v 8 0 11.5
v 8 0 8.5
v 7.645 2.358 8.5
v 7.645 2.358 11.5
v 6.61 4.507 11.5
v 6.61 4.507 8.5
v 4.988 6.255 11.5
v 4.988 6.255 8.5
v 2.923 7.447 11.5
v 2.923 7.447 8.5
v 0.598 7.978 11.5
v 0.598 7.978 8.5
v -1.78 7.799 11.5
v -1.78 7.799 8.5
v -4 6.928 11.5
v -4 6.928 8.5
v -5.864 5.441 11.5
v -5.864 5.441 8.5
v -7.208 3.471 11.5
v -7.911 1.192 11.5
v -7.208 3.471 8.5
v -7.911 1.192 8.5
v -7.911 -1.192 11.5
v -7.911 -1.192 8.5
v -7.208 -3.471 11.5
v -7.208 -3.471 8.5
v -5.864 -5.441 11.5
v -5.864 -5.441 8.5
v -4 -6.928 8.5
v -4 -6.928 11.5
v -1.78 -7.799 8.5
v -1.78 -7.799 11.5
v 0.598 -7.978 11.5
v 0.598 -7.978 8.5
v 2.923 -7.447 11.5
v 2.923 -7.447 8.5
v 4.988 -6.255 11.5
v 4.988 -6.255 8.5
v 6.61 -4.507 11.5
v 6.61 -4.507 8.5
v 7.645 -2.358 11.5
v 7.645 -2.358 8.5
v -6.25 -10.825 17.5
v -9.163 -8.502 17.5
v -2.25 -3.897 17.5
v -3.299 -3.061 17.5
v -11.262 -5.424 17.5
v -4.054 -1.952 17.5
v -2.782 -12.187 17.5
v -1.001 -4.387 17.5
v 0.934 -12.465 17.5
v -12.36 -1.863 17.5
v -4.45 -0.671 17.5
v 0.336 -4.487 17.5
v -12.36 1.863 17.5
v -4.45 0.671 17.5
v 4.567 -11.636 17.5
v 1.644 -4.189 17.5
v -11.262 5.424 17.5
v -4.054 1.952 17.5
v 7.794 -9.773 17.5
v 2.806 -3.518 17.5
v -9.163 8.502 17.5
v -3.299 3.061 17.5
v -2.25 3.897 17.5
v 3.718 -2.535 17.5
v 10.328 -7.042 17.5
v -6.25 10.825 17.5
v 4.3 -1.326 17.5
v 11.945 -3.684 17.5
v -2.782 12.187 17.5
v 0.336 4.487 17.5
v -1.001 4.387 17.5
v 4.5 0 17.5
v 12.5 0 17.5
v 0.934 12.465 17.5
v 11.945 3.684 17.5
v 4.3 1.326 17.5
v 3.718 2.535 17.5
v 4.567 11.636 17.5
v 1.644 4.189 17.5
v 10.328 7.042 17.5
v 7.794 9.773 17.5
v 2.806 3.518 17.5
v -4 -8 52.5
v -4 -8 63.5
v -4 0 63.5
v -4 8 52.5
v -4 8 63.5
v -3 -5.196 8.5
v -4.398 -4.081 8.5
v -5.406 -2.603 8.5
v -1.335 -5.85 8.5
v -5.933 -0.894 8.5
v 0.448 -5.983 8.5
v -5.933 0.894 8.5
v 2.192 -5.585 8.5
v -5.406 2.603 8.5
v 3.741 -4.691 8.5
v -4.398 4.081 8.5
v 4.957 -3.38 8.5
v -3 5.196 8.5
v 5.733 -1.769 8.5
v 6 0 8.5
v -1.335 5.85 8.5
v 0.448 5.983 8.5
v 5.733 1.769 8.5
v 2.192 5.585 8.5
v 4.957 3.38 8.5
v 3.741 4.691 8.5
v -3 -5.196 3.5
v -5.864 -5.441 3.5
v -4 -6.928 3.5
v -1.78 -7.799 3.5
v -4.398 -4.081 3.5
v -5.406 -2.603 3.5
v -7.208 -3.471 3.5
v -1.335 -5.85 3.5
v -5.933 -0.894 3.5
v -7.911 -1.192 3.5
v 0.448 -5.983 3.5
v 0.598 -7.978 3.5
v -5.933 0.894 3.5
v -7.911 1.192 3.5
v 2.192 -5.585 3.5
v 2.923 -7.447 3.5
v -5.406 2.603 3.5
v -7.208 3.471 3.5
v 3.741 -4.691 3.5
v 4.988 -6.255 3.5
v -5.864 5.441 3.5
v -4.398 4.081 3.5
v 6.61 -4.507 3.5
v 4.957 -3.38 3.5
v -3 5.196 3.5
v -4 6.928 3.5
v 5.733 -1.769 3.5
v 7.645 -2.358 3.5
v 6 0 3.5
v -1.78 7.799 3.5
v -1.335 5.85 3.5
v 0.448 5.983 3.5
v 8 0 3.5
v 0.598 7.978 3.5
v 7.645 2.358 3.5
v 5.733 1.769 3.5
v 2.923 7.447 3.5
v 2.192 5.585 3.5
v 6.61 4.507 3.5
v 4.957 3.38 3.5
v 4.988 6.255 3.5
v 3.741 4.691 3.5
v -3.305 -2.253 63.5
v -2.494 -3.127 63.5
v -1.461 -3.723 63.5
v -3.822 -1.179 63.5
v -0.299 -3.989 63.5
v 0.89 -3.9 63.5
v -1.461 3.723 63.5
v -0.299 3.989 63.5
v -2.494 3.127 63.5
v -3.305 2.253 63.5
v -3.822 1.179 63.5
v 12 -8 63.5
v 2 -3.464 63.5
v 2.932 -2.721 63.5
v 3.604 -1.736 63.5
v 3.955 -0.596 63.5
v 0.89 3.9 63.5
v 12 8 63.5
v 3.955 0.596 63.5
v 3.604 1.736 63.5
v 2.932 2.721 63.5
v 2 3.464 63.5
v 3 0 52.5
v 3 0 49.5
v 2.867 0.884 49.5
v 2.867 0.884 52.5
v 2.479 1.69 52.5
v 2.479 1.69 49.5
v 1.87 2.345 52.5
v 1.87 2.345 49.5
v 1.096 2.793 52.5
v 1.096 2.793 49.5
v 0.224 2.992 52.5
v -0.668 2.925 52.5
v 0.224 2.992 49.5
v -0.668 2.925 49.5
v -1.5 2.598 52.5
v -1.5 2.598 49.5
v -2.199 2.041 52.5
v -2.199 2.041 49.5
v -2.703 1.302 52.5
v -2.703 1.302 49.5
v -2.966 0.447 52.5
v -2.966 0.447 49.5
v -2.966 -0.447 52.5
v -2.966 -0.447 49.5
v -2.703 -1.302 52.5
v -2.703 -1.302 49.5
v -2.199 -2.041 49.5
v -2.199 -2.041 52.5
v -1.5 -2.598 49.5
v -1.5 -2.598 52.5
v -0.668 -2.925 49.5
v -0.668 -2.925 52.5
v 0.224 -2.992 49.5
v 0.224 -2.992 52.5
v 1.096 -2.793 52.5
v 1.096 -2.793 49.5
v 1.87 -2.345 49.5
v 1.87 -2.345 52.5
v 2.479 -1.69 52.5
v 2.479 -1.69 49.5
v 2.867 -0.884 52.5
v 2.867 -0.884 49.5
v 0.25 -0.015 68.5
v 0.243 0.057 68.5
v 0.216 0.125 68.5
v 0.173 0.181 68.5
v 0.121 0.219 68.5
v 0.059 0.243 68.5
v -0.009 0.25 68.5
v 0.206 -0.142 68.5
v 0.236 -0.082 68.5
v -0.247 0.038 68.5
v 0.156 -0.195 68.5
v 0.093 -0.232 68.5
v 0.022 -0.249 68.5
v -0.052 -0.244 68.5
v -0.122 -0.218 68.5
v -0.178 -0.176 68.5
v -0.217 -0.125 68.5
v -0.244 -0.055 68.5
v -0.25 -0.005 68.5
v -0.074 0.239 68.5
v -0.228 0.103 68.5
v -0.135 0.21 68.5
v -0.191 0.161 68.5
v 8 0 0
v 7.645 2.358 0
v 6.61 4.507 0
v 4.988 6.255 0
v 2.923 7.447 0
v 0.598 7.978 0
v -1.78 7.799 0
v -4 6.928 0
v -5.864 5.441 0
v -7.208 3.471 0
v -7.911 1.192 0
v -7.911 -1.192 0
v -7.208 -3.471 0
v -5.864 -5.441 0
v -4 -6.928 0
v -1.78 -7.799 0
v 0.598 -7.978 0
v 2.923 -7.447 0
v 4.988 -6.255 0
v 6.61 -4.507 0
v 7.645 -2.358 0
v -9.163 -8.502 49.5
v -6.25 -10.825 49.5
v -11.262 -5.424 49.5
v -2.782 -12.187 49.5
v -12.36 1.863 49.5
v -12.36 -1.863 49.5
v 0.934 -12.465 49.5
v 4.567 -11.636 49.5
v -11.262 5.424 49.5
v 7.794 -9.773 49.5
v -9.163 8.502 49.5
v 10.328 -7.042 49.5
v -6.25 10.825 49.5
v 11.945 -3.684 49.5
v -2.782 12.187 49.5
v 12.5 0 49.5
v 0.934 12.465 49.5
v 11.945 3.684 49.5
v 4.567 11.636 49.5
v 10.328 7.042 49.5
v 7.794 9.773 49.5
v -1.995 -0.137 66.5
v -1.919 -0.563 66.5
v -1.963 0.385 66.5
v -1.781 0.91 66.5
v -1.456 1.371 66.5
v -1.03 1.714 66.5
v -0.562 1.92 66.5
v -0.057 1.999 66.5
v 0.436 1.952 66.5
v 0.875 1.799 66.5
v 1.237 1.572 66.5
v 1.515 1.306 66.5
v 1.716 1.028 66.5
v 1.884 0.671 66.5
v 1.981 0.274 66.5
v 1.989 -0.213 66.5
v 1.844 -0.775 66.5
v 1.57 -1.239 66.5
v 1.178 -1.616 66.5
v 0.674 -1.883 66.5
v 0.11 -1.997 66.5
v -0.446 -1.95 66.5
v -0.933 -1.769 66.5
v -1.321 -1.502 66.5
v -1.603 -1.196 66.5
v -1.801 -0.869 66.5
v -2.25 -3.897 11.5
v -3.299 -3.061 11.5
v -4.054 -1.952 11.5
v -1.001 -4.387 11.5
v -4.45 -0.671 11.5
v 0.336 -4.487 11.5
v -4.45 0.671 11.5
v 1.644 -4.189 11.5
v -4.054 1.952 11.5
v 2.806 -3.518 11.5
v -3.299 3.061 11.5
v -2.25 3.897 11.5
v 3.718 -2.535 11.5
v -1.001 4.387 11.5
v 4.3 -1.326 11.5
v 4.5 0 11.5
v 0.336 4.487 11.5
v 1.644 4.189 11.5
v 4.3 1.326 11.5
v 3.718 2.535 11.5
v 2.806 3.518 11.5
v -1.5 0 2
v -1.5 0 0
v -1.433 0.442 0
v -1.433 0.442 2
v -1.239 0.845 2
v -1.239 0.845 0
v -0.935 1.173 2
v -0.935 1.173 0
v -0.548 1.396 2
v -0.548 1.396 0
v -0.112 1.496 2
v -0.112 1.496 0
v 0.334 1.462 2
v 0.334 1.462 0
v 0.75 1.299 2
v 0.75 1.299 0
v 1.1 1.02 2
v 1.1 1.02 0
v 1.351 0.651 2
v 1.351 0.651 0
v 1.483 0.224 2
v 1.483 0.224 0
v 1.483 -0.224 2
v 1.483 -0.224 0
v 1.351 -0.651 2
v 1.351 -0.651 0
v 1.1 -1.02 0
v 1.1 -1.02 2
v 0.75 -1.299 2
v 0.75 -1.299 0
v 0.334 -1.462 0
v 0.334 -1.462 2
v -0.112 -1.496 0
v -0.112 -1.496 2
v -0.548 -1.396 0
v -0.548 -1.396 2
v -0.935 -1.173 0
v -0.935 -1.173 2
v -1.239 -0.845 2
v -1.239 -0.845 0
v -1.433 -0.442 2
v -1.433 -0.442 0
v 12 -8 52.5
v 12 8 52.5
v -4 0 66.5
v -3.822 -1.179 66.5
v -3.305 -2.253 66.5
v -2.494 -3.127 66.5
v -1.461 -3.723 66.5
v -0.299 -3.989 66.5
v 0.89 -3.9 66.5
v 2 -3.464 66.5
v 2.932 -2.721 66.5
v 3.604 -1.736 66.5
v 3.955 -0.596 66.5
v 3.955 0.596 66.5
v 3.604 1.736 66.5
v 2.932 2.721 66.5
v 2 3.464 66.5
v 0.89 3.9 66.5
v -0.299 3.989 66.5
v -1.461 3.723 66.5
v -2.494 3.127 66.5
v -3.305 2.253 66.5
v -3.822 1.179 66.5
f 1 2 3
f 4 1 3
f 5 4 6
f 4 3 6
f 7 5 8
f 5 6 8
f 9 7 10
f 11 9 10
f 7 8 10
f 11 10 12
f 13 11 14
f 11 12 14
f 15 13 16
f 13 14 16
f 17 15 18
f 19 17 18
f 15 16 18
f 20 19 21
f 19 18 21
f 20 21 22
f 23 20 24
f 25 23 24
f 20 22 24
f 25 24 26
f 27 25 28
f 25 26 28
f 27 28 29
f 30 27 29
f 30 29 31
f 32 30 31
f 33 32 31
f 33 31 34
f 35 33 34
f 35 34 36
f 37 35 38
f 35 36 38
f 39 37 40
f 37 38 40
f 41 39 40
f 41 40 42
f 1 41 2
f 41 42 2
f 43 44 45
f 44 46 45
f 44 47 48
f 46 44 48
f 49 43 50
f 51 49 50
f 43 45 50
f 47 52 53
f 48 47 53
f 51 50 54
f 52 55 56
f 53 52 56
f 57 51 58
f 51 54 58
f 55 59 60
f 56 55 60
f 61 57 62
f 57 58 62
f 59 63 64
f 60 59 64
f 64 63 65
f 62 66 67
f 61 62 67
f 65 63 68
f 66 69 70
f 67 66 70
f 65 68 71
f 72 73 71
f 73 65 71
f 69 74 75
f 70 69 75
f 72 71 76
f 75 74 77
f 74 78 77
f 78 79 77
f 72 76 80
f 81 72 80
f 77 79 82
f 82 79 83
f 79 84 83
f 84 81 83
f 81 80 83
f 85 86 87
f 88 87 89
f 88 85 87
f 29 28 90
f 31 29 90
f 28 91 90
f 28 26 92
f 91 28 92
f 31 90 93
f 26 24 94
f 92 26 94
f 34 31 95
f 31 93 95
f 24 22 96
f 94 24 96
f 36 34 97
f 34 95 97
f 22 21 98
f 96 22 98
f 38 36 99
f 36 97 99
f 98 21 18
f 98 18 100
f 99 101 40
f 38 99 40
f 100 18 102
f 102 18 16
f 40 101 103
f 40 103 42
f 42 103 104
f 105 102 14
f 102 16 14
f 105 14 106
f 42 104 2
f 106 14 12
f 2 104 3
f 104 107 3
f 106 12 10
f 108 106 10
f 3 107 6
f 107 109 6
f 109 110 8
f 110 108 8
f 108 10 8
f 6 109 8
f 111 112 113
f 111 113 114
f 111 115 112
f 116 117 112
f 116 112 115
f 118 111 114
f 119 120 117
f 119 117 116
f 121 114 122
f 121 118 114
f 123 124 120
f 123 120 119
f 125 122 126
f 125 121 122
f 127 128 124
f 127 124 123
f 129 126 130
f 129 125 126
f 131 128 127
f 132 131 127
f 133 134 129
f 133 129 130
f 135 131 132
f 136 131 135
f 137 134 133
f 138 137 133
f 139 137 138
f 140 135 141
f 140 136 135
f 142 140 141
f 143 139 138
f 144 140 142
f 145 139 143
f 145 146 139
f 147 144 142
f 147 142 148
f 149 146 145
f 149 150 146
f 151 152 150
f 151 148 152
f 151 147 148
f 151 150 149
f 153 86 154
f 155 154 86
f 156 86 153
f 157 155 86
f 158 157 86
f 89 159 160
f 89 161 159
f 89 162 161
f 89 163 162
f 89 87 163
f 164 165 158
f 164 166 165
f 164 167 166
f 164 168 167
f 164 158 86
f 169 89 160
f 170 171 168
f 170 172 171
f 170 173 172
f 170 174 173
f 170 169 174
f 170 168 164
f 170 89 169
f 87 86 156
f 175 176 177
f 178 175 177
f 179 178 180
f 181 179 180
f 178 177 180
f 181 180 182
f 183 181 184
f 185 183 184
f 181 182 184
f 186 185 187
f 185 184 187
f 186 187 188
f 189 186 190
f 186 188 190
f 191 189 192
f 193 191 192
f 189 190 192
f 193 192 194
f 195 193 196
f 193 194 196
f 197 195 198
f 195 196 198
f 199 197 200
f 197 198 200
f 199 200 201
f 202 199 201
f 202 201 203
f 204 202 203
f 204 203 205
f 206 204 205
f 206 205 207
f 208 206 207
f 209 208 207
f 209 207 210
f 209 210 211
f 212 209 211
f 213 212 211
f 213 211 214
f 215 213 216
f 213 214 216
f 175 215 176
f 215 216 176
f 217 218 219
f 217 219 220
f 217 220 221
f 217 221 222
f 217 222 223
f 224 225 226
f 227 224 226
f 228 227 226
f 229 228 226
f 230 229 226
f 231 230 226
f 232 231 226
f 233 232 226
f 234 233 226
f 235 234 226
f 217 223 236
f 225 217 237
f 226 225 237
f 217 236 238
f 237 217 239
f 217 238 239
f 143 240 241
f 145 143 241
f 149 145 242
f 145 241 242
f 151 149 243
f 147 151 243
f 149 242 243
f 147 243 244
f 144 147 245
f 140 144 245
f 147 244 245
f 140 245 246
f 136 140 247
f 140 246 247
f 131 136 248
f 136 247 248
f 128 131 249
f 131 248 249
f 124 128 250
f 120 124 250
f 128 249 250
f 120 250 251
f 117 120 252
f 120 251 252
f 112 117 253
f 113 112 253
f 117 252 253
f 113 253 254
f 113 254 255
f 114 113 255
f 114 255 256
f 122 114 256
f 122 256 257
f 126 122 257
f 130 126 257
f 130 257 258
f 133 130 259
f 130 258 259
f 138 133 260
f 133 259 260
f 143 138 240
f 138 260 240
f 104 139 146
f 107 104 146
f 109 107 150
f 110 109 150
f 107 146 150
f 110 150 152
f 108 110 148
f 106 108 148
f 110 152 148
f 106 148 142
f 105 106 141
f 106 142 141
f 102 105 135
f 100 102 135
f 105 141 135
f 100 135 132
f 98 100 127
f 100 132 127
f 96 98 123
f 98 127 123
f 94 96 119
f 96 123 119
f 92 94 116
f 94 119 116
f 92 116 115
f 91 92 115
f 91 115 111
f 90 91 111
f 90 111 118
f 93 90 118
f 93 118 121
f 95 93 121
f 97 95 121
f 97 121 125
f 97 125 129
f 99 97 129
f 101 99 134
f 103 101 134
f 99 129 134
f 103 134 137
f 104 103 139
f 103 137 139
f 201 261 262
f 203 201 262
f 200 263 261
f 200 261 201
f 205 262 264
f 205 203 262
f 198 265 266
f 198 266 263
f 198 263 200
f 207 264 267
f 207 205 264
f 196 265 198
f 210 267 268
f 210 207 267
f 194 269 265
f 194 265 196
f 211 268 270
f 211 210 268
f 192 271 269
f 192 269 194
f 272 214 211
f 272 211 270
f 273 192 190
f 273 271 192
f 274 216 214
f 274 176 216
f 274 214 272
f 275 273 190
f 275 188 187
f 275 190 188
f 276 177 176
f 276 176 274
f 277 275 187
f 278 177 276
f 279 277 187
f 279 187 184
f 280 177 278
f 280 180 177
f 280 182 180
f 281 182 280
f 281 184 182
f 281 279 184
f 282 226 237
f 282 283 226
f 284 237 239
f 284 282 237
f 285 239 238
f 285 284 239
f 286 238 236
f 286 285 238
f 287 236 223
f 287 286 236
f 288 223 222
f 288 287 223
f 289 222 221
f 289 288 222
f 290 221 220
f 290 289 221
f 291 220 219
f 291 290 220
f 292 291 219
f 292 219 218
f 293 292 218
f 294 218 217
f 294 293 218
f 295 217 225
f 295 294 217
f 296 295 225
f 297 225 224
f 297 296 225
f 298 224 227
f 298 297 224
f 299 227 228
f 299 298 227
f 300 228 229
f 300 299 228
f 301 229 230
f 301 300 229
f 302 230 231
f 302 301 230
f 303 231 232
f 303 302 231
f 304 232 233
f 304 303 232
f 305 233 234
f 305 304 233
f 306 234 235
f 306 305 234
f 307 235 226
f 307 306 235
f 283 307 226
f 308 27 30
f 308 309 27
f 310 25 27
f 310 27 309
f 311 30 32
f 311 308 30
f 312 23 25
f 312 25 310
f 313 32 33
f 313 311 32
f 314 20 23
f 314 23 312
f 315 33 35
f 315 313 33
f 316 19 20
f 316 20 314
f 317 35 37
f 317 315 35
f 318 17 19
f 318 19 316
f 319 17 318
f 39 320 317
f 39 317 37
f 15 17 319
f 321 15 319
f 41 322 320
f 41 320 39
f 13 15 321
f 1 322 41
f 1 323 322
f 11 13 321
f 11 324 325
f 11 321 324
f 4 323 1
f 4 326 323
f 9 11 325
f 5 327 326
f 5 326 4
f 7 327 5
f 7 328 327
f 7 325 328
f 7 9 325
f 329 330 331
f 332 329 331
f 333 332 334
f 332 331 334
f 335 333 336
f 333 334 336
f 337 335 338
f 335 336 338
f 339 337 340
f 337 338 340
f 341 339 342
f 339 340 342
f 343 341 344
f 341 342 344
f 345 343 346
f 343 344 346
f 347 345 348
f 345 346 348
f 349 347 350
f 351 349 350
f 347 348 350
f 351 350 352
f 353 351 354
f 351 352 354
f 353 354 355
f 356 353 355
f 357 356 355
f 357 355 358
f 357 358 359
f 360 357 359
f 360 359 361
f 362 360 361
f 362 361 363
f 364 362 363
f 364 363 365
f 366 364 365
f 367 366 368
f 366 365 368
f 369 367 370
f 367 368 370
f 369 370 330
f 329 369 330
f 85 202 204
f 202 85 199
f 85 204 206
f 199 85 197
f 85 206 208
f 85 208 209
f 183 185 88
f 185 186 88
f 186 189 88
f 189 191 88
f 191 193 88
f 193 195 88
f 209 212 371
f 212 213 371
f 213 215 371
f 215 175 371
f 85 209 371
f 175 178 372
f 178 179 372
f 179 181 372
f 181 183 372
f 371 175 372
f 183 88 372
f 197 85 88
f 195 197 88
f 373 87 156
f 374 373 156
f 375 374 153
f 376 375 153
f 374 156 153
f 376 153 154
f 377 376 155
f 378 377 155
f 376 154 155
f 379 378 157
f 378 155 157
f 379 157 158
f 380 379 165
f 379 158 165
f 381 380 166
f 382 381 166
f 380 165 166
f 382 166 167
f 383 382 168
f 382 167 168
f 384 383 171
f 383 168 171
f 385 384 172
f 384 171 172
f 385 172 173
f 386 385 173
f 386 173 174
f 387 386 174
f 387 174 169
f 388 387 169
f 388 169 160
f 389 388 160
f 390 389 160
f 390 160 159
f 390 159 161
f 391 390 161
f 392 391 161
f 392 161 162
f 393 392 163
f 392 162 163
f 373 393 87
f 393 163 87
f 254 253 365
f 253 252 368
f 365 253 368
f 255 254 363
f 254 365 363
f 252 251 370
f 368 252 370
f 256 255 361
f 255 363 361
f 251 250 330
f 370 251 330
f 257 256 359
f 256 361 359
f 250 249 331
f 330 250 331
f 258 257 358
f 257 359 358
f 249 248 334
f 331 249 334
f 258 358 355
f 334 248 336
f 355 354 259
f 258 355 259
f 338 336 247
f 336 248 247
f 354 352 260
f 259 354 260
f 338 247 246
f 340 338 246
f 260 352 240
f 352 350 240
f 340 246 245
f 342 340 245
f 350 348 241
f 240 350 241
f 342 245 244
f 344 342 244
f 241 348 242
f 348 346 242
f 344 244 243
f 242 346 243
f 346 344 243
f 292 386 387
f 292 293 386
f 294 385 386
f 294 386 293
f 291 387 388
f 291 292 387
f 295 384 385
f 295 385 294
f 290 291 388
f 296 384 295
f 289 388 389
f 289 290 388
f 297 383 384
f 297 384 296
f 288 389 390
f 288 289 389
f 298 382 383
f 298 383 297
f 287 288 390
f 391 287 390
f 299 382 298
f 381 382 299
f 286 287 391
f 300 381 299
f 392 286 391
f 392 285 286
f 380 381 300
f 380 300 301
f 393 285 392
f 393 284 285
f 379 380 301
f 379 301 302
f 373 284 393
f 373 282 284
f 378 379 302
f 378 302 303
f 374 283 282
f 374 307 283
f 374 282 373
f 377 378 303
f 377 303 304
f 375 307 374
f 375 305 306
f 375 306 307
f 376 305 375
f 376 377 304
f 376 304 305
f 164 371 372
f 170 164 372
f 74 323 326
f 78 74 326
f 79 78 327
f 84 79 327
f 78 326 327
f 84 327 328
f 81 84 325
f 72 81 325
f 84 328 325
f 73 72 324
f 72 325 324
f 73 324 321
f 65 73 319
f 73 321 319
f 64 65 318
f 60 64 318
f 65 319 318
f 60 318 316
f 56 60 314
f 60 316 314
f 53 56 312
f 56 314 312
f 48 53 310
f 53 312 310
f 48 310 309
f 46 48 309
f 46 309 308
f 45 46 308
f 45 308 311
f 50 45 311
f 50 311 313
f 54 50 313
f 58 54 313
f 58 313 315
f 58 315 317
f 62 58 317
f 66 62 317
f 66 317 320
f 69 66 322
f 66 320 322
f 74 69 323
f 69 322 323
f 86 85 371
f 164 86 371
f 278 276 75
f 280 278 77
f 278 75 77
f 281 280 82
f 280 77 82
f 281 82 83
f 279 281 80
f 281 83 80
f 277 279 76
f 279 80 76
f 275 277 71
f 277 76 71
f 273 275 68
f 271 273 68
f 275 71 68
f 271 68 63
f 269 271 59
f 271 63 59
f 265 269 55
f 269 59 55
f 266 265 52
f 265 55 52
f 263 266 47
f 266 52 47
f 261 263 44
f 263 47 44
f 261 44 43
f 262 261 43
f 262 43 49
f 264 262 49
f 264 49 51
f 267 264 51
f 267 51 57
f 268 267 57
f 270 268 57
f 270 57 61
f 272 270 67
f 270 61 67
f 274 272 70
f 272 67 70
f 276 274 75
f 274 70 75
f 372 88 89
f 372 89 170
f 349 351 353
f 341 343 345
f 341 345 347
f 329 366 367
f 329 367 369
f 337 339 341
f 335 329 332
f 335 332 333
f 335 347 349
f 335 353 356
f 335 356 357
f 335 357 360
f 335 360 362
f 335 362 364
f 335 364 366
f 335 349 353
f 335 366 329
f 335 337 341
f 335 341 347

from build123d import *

# Parameters (mm, degrees)
SKETCH1_R           = 8
BOSS_EXTRUDE1_DEPTH = 3.5
SKETCH2_R           = 6
BOSS_EXTRUDE2_DEPTH = 5
SKETCH3_R           = 8
BOSS_EXTRUDE3_DEPTH = 3
SKETCH4_R           = 4.5
BOSS_EXTRUDE4_DEPTH = 6
SKETCH5_R           = 12.5
BOSS_EXTRUDE5_DEPTH = 32
SKETCH6_R           = 3
BOSS_EXTRUDE6_DEPTH = 3
SKETCH7_W           = 16
SKETCH7_H           = 16
BOSS_EXTRUDE7_DEPTH = 11
SKETCH8_R           = 4
BOSS_EXTRUDE8_DEPTH = 3
SKETCH10_R          = 1.5
CUT_EXTRUDE1_DEPTH  = 2


with BuildPart() as part:
    # Sketch1 → Boss-Extrude1 (new body)
    with BuildSketch(Plane.XY):
        Circle(SKETCH1_R)
    extrude(amount=BOSS_EXTRUDE1_DEPTH)

    # Sketch2 → Boss-Extrude2 (add)
    with BuildSketch(Plane.XY.offset(3.5)):
        Circle(SKETCH2_R)
    extrude(amount=BOSS_EXTRUDE2_DEPTH)

    # Sketch3 → Boss-Extrude3 (add)
    with BuildSketch(Plane.XY.offset(8.5)):
        Circle(SKETCH3_R)
    extrude(amount=BOSS_EXTRUDE3_DEPTH)

    # Sketch4 → Boss-Extrude4 (add)
    with BuildSketch(Plane.XY.offset(11.5)):
        Circle(SKETCH4_R)
    extrude(amount=BOSS_EXTRUDE4_DEPTH)

    # Sketch5 → Boss-Extrude5 (add)
    with BuildSketch(Plane.XY.offset(17.5)):
        Circle(SKETCH5_R)
    extrude(amount=BOSS_EXTRUDE5_DEPTH)

    # Sketch6 → Boss-Extrude6 (add)
    with BuildSketch(Plane.XY.offset(49.5)):
        Circle(SKETCH6_R)
    extrude(amount=BOSS_EXTRUDE6_DEPTH)

    # Sketch7 → Boss-Extrude7 (add)
    with BuildSketch(Plane.XY.offset(52.5)):
        with Locations((4, 0)):
            Rectangle(SKETCH7_W, SKETCH7_H)
    extrude(amount=BOSS_EXTRUDE7_DEPTH)

    # Sketch8 → Boss-Extrude8 (add)
    with BuildSketch(Plane.XY.offset(63.5)):
        with Locations(Location((0, 0, 0), (0, 0, 180))):
            Circle(SKETCH8_R)
    extrude(amount=BOSS_EXTRUDE8_DEPTH)

    # Sketch10 → Cut-Extrude1 (cut)
    with BuildSketch(Plane(origin=(0, 0, 0), x_dir=(-1, 0, 0), z_dir=(0, 0, -1))):
        Circle(SKETCH10_R)
    extrude(amount=-CUT_EXTRUDE1_DEPTH, mode=Mode.SUBTRACT)

    # Loft1: read off the stored shape, not the designer's step
    # Loft1: loft between two sections, ruled curve by curve
    loft1_from = [
        Edge.make_bspline([(-0.247162936, 0.037556397, 68.5), (-0.172050142, 0.53188227, 68.5), (0.322275731, 0.456769475, 68.5), (0.247162936, -0.037556397, 68.5), (0.172050142, -0.53188227, 68.5), (-0.322275731, -0.456769475, 68.5), (-0.247162936, 0.037556397, 68.5)], [0, 0, 0, 0, 0.5, 0.5, 0.5, 1, 1, 1, 1], 3, [1, 0.333333333, 0.333333333, 1, 0.333333333, 0.333333333, 1]),
    ]
    loft1_to = [
        Edge.make_bspline([(-1.919178945, -0.562807407, 66.5), (-3.044793759, 3.275550482, 66.5), (0.79356413, 4.401165297, 66.5), (1.919178945, 0.562807407, 66.5), (3.044793759, -3.275550482, 66.5), (-0.79356413, -4.401165297, 66.5), (-1.919178945, -0.562807407, 66.5)], [0, 0, 0, 0, 0.5, 0.5, 0.5, 1, 1, 1, 1], 3, [1, 0.333333333, 0.333333333, 1, 0.333333333, 0.333333333, 1]),
    ]
    loft1 = Solid(Shell([*[Face.make_surface_from_curves(loft1_from[k], loft1_to[k]) for k in range(1)], Face(Wire(loft1_from)), Face(Wire(loft1_to))]))
    add(loft1)


solid = part.part
